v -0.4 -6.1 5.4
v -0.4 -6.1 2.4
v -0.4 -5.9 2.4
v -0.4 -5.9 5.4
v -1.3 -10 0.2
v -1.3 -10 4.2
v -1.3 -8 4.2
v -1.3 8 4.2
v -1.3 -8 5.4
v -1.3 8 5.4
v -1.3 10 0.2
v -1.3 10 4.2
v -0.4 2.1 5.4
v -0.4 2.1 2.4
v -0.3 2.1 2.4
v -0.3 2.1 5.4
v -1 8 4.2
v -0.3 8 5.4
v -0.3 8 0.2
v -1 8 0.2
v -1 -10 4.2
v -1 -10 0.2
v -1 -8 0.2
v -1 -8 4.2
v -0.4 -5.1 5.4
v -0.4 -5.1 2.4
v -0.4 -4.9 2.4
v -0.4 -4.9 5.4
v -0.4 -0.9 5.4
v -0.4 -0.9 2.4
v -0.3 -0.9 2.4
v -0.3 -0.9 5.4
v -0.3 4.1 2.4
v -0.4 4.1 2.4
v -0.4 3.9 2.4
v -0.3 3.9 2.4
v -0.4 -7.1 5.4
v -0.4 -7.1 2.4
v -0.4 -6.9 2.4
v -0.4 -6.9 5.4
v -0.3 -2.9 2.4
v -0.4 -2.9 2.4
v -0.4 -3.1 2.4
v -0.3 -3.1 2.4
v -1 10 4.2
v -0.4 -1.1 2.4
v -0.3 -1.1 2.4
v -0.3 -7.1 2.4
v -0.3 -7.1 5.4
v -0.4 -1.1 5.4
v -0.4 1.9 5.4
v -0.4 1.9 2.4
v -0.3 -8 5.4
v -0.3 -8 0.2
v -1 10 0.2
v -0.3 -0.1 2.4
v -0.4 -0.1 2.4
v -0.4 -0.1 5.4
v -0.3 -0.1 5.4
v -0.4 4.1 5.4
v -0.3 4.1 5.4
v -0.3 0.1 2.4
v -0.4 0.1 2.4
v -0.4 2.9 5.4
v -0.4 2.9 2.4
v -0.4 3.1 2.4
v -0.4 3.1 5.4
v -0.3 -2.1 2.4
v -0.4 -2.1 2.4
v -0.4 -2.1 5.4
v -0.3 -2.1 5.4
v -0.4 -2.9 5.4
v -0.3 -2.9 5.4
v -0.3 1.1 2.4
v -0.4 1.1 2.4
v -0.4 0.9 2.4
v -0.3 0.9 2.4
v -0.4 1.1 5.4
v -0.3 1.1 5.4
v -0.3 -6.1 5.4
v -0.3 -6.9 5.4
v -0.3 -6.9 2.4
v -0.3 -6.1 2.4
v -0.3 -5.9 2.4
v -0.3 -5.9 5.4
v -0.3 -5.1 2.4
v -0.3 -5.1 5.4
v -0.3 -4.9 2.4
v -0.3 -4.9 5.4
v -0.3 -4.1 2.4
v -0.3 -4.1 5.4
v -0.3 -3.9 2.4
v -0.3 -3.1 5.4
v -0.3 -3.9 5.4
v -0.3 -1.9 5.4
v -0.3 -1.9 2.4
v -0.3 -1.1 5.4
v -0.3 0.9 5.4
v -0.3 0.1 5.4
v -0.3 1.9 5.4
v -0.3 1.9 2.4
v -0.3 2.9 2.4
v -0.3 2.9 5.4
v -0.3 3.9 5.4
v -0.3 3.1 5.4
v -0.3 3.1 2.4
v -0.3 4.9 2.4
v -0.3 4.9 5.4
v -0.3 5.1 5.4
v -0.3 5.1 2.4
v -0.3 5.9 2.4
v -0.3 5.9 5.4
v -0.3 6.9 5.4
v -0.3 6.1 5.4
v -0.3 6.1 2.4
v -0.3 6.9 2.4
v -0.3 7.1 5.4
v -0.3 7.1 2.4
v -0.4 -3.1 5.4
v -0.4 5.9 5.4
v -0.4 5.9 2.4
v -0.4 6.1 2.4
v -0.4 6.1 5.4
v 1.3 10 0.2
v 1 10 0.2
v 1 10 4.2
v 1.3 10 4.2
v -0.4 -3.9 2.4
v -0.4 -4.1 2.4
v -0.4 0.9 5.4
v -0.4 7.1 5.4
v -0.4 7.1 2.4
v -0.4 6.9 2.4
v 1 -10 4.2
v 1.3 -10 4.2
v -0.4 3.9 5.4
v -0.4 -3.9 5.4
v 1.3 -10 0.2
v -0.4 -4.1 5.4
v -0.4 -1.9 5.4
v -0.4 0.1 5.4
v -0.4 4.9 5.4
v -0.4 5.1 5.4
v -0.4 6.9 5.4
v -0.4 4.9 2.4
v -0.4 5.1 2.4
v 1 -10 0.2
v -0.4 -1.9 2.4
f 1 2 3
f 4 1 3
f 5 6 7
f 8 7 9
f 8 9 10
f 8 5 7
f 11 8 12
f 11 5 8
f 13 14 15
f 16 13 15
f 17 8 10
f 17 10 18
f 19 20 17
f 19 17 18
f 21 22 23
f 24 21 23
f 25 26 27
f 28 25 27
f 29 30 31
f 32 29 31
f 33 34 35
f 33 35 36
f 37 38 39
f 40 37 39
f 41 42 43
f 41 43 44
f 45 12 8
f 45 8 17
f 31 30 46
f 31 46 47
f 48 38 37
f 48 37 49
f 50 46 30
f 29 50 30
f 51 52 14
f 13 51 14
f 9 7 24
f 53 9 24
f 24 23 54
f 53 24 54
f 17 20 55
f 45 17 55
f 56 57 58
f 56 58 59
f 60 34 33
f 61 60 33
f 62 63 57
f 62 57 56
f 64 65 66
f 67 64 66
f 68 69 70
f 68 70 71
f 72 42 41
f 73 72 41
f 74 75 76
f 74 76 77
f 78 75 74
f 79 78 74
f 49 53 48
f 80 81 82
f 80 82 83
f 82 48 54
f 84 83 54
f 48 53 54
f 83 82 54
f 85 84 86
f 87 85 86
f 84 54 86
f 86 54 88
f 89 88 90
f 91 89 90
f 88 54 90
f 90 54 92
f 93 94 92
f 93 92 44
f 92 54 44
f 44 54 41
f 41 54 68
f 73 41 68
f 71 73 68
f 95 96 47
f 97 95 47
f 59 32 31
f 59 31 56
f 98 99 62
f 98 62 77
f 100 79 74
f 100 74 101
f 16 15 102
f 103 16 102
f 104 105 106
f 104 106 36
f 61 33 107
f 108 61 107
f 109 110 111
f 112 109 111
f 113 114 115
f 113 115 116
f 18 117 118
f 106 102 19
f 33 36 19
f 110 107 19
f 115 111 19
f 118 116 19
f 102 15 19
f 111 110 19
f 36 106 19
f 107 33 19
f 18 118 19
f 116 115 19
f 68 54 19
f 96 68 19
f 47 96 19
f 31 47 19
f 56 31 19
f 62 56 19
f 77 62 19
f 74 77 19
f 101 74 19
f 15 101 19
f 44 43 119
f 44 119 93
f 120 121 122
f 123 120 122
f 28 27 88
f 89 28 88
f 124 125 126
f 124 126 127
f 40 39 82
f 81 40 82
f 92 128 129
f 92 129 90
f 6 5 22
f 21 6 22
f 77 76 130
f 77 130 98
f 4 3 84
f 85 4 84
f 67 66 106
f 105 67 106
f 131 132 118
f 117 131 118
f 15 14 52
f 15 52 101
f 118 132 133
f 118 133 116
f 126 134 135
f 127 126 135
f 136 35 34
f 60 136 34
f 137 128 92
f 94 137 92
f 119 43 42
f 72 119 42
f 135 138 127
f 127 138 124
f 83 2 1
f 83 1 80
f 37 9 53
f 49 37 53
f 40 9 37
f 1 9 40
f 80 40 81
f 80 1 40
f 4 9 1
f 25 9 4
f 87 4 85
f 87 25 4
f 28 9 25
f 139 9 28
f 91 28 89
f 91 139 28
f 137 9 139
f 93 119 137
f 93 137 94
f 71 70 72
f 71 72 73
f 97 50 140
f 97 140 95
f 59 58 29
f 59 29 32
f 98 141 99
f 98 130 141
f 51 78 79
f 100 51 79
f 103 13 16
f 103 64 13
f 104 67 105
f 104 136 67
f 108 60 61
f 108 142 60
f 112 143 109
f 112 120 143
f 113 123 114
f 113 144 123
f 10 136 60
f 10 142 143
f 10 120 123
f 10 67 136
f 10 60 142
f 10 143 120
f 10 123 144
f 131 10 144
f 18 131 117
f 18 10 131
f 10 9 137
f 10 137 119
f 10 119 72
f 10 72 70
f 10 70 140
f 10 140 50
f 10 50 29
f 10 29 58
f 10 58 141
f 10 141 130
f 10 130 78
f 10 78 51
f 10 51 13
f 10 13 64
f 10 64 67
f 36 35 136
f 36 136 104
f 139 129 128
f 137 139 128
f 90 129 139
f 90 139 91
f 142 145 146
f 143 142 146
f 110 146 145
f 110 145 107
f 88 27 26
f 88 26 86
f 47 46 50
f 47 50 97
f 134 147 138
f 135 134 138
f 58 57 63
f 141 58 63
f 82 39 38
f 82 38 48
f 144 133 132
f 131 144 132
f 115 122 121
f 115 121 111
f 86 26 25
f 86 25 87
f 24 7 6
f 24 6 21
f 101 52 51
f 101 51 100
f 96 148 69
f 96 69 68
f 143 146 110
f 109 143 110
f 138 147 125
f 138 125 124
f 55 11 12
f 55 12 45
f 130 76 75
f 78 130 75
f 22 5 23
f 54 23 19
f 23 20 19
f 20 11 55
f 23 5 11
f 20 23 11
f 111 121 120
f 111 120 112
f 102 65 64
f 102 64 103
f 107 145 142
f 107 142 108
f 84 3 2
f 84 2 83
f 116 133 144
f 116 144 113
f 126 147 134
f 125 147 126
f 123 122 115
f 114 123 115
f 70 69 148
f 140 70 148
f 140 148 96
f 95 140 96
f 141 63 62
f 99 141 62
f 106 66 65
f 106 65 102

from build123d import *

# Parameters (mm, degrees)
BOX059_W         = 0.3
BOX059_H         = 20
BOX059_DEPTH     = 4
BOX061_W         = 0.1
BOX061_H         = 0.2
BOX061_DEPTH     = 3
ARRAY017_Y_COUNT = 15
ARRAY017_Y_PITCH = 1
BOX060_W         = 1
BOX060_H         = 16
BOX060_DEPTH     = 5.2


with BuildPart() as cube033:
    # Box059 → Box059 (new body)
    with BuildSketch(Plane(origin=(1, -10, 0.2), x_dir=(1, 0, 0), z_dir=(0, 0, 1))):
        with Locations((0.15, 10)):
            Rectangle(BOX059_W, BOX059_H)
    extrude(amount=BOX059_DEPTH)


with BuildPart() as cube048:
    # Clone030 base: copy of Cube033
    add(cube033.part)


with BuildPart() as cube048_1:
    # Clone030 placement: moved
    add(cube048.part.moved(Location((-2.3, 0, 0))))


with BuildPart() as array017:
    # Box061 → Box061 (new body)
    with BuildSketch(Plane(origin=(-0.4, -7.1, 2.4), x_dir=(1, 0, 0), z_dir=(0, 0, 1))):
        with Locations((0.05, 0.1)):
            Rectangle(BOX061_W, BOX061_H)
    extrude(amount=BOX061_DEPTH)

    # Array017 Y: Array017 ×15


with BuildPart() as array017_1:
    add(array017.part)
    with Locations(*[(0, i * ARRAY017_Y_PITCH, 0) for i in range(1, ARRAY017_Y_COUNT)]):
        add(array017.part)


with BuildPart() as cut012:
    # Box060 → Box060 (new body)
    with BuildSketch(Plane(origin=(-1.3, -8, 0.2), x_dir=(1, 0, 0), z_dir=(0, 0, 1))):
        with Locations((0.5, 8)):
            Rectangle(BOX060_W, BOX060_H)
    extrude(amount=BOX060_DEPTH)

    # Cut012: cut Array017
    add(array017_1.part, mode=Mode.SUBTRACT)


with BuildPart() as holder:
    # Fusion045 base: copy of Cube033
    add(cube033.part)

    # Fusion045: union Cube048, Cut012
    add(cube048_1.part)
    add(cut012.part)


solid = holder.part
